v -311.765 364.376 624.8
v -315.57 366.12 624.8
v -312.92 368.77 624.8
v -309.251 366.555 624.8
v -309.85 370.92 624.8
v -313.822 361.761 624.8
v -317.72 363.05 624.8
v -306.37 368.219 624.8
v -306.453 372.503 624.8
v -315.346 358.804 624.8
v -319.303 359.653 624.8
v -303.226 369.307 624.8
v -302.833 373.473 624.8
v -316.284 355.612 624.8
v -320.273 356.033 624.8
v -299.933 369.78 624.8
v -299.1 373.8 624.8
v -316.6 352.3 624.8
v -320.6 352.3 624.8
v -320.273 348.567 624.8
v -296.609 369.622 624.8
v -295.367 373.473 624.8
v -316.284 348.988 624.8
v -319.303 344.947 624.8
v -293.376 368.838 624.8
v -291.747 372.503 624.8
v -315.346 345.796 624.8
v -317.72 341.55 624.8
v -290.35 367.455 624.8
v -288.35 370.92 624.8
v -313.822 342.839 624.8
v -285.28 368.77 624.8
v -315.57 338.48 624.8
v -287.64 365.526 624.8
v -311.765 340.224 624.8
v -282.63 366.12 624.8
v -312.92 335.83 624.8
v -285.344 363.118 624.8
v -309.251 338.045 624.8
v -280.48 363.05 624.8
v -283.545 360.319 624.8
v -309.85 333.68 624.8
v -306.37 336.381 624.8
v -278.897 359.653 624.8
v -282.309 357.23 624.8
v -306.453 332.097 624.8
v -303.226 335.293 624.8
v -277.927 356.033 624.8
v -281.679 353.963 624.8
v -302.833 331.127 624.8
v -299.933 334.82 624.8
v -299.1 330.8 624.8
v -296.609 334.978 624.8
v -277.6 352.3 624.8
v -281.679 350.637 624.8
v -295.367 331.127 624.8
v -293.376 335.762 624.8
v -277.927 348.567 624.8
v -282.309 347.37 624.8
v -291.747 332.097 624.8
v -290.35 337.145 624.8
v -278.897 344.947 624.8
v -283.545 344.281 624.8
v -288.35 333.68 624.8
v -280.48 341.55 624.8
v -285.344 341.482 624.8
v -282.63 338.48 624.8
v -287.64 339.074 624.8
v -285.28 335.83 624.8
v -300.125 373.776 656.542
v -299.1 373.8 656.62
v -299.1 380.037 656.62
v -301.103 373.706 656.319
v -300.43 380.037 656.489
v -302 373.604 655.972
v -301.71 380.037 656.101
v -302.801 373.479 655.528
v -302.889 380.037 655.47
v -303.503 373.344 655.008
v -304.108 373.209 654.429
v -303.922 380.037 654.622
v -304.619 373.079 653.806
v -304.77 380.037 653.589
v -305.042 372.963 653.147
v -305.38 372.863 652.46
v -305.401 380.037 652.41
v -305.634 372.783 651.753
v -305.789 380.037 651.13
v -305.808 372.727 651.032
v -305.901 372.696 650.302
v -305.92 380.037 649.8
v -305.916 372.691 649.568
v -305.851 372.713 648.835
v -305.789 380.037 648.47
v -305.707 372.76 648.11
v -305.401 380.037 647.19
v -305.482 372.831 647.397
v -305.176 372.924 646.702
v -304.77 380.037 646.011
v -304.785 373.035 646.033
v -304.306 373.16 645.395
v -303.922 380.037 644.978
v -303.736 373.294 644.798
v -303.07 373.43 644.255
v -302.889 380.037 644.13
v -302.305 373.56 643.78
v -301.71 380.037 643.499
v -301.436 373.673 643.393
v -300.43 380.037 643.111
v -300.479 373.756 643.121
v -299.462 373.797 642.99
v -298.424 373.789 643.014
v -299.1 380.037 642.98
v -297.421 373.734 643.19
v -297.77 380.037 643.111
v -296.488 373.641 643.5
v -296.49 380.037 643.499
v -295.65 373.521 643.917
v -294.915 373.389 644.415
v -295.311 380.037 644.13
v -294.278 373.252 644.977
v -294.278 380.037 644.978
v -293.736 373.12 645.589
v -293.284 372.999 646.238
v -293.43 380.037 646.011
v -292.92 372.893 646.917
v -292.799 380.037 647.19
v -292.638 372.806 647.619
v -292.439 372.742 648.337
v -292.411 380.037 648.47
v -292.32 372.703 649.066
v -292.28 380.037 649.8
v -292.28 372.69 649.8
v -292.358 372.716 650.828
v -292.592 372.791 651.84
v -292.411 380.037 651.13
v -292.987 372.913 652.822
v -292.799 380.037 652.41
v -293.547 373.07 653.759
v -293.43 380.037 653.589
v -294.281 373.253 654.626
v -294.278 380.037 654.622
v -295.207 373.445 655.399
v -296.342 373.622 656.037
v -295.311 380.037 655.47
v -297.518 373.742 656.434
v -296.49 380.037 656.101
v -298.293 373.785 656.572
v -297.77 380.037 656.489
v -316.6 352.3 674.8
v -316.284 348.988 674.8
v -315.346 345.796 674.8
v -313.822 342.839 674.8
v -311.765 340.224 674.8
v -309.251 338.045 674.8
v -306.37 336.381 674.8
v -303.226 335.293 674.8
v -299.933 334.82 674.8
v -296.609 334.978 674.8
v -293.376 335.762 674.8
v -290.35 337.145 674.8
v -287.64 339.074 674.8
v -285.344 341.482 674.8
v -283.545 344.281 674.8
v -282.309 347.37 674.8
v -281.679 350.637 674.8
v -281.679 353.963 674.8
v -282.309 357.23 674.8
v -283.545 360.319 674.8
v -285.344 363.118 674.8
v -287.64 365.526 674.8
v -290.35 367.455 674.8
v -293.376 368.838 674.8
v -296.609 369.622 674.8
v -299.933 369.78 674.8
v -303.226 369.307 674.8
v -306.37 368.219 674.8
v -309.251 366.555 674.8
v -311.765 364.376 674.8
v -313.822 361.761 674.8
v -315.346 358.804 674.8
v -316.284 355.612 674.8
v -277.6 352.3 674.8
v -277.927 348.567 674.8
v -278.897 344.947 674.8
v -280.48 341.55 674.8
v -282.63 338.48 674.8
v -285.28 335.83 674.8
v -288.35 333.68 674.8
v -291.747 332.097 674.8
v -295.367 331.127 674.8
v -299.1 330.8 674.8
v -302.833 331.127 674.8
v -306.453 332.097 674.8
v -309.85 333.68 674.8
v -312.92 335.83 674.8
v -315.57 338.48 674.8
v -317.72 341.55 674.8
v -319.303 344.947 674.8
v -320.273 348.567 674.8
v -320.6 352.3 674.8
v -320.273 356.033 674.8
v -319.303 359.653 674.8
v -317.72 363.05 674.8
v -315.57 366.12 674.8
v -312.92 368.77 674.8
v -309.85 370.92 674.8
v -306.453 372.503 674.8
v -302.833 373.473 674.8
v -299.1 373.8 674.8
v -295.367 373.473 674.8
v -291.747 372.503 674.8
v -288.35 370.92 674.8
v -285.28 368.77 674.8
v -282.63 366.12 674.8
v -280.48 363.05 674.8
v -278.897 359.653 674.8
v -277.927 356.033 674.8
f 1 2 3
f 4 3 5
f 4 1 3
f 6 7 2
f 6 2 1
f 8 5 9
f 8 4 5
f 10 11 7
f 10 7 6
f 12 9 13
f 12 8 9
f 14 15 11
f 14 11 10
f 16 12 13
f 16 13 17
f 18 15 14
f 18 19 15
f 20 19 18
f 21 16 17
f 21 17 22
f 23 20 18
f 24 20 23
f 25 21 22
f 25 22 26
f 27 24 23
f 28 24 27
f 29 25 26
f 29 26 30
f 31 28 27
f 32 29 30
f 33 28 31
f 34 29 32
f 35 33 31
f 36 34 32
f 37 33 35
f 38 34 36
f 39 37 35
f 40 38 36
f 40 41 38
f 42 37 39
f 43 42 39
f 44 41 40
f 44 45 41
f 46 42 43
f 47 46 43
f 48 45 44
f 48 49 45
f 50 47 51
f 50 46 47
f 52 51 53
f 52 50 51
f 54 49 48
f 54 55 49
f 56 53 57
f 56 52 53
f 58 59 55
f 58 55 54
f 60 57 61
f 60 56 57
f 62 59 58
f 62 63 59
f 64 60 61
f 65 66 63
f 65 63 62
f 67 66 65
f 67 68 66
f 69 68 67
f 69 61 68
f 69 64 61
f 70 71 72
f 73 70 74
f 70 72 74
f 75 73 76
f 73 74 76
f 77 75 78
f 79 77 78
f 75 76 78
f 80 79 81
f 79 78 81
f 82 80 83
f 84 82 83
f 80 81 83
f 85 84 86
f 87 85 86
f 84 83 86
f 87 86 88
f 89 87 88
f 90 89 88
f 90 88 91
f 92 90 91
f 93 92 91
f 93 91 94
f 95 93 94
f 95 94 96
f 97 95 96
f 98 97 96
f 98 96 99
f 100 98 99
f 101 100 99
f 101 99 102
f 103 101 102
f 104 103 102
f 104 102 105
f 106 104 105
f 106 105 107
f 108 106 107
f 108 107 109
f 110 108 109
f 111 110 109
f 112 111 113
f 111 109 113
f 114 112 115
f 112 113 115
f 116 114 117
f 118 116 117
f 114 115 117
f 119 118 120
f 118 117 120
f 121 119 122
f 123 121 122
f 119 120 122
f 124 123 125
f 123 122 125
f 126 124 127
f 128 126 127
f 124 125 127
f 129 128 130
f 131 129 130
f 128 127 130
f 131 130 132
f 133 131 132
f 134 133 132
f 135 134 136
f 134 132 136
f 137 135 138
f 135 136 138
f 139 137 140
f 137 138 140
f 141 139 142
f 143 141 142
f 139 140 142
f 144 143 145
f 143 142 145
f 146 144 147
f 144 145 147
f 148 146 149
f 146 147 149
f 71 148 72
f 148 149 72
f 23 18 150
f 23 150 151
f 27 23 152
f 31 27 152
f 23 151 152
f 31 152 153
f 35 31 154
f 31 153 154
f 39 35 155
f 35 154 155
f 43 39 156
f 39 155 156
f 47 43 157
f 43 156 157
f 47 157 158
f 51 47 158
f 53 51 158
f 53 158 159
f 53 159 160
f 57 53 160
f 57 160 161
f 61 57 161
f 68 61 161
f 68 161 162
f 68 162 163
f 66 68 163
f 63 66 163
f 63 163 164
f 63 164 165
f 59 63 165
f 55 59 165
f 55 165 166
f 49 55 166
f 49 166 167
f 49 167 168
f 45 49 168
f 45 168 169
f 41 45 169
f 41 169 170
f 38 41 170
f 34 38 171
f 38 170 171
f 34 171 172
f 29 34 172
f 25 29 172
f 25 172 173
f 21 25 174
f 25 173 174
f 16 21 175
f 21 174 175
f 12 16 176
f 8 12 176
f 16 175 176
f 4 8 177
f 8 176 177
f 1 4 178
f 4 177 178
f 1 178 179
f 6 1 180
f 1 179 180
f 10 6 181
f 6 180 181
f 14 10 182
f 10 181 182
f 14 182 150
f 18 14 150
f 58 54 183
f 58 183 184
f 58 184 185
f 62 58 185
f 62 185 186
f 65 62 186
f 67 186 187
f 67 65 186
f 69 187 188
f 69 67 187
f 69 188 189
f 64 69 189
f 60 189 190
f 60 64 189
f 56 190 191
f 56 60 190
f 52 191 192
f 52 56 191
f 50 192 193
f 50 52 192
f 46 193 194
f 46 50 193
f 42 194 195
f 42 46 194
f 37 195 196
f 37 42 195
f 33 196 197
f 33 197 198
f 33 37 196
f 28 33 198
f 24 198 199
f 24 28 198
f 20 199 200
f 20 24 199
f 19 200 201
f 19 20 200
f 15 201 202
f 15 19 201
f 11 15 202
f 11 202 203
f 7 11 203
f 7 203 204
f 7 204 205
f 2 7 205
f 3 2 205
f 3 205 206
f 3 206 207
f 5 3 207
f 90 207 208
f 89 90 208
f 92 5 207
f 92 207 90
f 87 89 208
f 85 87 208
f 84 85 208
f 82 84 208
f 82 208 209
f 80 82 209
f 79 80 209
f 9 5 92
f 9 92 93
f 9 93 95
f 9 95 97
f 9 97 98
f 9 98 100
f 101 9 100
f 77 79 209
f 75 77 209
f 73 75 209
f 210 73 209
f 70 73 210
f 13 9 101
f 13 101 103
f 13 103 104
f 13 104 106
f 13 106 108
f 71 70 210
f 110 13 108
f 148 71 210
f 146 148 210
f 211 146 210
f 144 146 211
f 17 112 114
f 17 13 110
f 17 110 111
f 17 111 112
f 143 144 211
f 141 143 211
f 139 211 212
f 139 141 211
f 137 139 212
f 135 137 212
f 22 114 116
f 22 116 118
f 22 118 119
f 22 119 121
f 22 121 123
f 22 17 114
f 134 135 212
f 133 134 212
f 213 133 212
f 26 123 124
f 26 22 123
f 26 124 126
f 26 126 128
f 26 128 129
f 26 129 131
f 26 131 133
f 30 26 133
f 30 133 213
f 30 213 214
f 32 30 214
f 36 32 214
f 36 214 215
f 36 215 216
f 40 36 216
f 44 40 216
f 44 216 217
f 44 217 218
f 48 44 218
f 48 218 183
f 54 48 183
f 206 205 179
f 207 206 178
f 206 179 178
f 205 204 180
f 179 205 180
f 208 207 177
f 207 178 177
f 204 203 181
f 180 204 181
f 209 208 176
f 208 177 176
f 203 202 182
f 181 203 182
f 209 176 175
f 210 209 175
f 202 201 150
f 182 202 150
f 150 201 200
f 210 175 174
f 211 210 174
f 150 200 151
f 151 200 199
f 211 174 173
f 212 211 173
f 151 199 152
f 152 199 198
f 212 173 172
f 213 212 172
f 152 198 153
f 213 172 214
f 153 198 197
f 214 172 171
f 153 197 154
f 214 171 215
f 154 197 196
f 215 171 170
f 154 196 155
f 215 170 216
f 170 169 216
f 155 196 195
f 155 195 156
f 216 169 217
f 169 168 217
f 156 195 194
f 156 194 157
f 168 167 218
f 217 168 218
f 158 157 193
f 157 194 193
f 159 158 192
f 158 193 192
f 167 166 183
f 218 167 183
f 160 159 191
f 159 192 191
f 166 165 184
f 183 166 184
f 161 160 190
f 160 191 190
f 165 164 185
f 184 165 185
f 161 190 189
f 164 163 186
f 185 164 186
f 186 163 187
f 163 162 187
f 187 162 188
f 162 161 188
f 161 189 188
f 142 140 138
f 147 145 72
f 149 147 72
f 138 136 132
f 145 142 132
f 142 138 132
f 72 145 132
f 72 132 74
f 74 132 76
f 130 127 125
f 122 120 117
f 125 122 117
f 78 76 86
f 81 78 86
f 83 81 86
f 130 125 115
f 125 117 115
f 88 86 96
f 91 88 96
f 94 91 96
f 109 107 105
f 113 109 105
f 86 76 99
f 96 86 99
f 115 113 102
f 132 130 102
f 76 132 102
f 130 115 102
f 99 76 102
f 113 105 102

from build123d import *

# Parameters (mm, degrees)
SKETCH1_R                = 21.5
BOSS_EXTRUDE1_DEPTH      = 50
SKETCH2_R                = 17.5
CUT_EXTRUDE1_DEPTH       = 495.985656358
BOSS_EXTRUDE2_REACH      = 750.708
BOSS_EXTRUDE2_END_RADIUS = 21.5


with BuildPart() as part:
    # Sketch1 → Boss-Extrude1 (new body)
    with BuildSketch(Plane(origin=(0, 0, 624.8), x_dir=(-1, 0, 0), z_dir=(0, 0, -1))):
        with Locations(Location((299.1, 352.3, 0), (0, 0, 180))):
            Circle(SKETCH1_R)
    extrude(amount=-BOSS_EXTRUDE1_DEPTH)

    # Sketch2 → Cut-Extrude1 (cut, through all)
    with BuildSketch(Plane.XY.offset(674.8)):
        with Locations(Location((-299.1, 352.3, 0), (0, 0, 180))):
            Circle(SKETCH2_R)
    extrude(amount=-CUT_EXTRUDE1_DEPTH, mode=Mode.SUBTRACT)

    # Boss-Extrude2: up to this cylinder (the profile starts outside it)
    boss_extrude2_end = Plane(origin=(-299.1, 352.3, 649.8), z_dir=(0, 0, -1)) * Cylinder(BOSS_EXTRUDE2_END_RADIUS, 1545.416, mode=Mode.PRIVATE)
    # Sketch3 → Boss-Extrude2 (add, up to the surface)
    with BuildSketch(Plane(origin=(0, 380.036620923, 0), x_dir=(1, 0, 0), z_dir=(0, 1, 0)), mode=Mode.PRIVATE) as boss_extrude2_sk1:
        with BuildLine():
            ThreePointArc((-292.280237329, -649.8), (-294.277699569, -654.622300431), (-299.1, -656.619762671))
            ThreePointArc((-299.1, -656.619762671), (-303.922300431, -644.977699569), (-292.280237329, -649.8))
        make_face()
    boss_extrude2_tool1 = extrude(boss_extrude2_sk1.sketch, amount=-BOSS_EXTRUDE2_REACH, mode=Mode.PRIVATE) - boss_extrude2_end
    add(boss_extrude2_tool1.solids().sort_by_distance((-299.1, 380.036621, 649.8))[0])


solid = part.part
